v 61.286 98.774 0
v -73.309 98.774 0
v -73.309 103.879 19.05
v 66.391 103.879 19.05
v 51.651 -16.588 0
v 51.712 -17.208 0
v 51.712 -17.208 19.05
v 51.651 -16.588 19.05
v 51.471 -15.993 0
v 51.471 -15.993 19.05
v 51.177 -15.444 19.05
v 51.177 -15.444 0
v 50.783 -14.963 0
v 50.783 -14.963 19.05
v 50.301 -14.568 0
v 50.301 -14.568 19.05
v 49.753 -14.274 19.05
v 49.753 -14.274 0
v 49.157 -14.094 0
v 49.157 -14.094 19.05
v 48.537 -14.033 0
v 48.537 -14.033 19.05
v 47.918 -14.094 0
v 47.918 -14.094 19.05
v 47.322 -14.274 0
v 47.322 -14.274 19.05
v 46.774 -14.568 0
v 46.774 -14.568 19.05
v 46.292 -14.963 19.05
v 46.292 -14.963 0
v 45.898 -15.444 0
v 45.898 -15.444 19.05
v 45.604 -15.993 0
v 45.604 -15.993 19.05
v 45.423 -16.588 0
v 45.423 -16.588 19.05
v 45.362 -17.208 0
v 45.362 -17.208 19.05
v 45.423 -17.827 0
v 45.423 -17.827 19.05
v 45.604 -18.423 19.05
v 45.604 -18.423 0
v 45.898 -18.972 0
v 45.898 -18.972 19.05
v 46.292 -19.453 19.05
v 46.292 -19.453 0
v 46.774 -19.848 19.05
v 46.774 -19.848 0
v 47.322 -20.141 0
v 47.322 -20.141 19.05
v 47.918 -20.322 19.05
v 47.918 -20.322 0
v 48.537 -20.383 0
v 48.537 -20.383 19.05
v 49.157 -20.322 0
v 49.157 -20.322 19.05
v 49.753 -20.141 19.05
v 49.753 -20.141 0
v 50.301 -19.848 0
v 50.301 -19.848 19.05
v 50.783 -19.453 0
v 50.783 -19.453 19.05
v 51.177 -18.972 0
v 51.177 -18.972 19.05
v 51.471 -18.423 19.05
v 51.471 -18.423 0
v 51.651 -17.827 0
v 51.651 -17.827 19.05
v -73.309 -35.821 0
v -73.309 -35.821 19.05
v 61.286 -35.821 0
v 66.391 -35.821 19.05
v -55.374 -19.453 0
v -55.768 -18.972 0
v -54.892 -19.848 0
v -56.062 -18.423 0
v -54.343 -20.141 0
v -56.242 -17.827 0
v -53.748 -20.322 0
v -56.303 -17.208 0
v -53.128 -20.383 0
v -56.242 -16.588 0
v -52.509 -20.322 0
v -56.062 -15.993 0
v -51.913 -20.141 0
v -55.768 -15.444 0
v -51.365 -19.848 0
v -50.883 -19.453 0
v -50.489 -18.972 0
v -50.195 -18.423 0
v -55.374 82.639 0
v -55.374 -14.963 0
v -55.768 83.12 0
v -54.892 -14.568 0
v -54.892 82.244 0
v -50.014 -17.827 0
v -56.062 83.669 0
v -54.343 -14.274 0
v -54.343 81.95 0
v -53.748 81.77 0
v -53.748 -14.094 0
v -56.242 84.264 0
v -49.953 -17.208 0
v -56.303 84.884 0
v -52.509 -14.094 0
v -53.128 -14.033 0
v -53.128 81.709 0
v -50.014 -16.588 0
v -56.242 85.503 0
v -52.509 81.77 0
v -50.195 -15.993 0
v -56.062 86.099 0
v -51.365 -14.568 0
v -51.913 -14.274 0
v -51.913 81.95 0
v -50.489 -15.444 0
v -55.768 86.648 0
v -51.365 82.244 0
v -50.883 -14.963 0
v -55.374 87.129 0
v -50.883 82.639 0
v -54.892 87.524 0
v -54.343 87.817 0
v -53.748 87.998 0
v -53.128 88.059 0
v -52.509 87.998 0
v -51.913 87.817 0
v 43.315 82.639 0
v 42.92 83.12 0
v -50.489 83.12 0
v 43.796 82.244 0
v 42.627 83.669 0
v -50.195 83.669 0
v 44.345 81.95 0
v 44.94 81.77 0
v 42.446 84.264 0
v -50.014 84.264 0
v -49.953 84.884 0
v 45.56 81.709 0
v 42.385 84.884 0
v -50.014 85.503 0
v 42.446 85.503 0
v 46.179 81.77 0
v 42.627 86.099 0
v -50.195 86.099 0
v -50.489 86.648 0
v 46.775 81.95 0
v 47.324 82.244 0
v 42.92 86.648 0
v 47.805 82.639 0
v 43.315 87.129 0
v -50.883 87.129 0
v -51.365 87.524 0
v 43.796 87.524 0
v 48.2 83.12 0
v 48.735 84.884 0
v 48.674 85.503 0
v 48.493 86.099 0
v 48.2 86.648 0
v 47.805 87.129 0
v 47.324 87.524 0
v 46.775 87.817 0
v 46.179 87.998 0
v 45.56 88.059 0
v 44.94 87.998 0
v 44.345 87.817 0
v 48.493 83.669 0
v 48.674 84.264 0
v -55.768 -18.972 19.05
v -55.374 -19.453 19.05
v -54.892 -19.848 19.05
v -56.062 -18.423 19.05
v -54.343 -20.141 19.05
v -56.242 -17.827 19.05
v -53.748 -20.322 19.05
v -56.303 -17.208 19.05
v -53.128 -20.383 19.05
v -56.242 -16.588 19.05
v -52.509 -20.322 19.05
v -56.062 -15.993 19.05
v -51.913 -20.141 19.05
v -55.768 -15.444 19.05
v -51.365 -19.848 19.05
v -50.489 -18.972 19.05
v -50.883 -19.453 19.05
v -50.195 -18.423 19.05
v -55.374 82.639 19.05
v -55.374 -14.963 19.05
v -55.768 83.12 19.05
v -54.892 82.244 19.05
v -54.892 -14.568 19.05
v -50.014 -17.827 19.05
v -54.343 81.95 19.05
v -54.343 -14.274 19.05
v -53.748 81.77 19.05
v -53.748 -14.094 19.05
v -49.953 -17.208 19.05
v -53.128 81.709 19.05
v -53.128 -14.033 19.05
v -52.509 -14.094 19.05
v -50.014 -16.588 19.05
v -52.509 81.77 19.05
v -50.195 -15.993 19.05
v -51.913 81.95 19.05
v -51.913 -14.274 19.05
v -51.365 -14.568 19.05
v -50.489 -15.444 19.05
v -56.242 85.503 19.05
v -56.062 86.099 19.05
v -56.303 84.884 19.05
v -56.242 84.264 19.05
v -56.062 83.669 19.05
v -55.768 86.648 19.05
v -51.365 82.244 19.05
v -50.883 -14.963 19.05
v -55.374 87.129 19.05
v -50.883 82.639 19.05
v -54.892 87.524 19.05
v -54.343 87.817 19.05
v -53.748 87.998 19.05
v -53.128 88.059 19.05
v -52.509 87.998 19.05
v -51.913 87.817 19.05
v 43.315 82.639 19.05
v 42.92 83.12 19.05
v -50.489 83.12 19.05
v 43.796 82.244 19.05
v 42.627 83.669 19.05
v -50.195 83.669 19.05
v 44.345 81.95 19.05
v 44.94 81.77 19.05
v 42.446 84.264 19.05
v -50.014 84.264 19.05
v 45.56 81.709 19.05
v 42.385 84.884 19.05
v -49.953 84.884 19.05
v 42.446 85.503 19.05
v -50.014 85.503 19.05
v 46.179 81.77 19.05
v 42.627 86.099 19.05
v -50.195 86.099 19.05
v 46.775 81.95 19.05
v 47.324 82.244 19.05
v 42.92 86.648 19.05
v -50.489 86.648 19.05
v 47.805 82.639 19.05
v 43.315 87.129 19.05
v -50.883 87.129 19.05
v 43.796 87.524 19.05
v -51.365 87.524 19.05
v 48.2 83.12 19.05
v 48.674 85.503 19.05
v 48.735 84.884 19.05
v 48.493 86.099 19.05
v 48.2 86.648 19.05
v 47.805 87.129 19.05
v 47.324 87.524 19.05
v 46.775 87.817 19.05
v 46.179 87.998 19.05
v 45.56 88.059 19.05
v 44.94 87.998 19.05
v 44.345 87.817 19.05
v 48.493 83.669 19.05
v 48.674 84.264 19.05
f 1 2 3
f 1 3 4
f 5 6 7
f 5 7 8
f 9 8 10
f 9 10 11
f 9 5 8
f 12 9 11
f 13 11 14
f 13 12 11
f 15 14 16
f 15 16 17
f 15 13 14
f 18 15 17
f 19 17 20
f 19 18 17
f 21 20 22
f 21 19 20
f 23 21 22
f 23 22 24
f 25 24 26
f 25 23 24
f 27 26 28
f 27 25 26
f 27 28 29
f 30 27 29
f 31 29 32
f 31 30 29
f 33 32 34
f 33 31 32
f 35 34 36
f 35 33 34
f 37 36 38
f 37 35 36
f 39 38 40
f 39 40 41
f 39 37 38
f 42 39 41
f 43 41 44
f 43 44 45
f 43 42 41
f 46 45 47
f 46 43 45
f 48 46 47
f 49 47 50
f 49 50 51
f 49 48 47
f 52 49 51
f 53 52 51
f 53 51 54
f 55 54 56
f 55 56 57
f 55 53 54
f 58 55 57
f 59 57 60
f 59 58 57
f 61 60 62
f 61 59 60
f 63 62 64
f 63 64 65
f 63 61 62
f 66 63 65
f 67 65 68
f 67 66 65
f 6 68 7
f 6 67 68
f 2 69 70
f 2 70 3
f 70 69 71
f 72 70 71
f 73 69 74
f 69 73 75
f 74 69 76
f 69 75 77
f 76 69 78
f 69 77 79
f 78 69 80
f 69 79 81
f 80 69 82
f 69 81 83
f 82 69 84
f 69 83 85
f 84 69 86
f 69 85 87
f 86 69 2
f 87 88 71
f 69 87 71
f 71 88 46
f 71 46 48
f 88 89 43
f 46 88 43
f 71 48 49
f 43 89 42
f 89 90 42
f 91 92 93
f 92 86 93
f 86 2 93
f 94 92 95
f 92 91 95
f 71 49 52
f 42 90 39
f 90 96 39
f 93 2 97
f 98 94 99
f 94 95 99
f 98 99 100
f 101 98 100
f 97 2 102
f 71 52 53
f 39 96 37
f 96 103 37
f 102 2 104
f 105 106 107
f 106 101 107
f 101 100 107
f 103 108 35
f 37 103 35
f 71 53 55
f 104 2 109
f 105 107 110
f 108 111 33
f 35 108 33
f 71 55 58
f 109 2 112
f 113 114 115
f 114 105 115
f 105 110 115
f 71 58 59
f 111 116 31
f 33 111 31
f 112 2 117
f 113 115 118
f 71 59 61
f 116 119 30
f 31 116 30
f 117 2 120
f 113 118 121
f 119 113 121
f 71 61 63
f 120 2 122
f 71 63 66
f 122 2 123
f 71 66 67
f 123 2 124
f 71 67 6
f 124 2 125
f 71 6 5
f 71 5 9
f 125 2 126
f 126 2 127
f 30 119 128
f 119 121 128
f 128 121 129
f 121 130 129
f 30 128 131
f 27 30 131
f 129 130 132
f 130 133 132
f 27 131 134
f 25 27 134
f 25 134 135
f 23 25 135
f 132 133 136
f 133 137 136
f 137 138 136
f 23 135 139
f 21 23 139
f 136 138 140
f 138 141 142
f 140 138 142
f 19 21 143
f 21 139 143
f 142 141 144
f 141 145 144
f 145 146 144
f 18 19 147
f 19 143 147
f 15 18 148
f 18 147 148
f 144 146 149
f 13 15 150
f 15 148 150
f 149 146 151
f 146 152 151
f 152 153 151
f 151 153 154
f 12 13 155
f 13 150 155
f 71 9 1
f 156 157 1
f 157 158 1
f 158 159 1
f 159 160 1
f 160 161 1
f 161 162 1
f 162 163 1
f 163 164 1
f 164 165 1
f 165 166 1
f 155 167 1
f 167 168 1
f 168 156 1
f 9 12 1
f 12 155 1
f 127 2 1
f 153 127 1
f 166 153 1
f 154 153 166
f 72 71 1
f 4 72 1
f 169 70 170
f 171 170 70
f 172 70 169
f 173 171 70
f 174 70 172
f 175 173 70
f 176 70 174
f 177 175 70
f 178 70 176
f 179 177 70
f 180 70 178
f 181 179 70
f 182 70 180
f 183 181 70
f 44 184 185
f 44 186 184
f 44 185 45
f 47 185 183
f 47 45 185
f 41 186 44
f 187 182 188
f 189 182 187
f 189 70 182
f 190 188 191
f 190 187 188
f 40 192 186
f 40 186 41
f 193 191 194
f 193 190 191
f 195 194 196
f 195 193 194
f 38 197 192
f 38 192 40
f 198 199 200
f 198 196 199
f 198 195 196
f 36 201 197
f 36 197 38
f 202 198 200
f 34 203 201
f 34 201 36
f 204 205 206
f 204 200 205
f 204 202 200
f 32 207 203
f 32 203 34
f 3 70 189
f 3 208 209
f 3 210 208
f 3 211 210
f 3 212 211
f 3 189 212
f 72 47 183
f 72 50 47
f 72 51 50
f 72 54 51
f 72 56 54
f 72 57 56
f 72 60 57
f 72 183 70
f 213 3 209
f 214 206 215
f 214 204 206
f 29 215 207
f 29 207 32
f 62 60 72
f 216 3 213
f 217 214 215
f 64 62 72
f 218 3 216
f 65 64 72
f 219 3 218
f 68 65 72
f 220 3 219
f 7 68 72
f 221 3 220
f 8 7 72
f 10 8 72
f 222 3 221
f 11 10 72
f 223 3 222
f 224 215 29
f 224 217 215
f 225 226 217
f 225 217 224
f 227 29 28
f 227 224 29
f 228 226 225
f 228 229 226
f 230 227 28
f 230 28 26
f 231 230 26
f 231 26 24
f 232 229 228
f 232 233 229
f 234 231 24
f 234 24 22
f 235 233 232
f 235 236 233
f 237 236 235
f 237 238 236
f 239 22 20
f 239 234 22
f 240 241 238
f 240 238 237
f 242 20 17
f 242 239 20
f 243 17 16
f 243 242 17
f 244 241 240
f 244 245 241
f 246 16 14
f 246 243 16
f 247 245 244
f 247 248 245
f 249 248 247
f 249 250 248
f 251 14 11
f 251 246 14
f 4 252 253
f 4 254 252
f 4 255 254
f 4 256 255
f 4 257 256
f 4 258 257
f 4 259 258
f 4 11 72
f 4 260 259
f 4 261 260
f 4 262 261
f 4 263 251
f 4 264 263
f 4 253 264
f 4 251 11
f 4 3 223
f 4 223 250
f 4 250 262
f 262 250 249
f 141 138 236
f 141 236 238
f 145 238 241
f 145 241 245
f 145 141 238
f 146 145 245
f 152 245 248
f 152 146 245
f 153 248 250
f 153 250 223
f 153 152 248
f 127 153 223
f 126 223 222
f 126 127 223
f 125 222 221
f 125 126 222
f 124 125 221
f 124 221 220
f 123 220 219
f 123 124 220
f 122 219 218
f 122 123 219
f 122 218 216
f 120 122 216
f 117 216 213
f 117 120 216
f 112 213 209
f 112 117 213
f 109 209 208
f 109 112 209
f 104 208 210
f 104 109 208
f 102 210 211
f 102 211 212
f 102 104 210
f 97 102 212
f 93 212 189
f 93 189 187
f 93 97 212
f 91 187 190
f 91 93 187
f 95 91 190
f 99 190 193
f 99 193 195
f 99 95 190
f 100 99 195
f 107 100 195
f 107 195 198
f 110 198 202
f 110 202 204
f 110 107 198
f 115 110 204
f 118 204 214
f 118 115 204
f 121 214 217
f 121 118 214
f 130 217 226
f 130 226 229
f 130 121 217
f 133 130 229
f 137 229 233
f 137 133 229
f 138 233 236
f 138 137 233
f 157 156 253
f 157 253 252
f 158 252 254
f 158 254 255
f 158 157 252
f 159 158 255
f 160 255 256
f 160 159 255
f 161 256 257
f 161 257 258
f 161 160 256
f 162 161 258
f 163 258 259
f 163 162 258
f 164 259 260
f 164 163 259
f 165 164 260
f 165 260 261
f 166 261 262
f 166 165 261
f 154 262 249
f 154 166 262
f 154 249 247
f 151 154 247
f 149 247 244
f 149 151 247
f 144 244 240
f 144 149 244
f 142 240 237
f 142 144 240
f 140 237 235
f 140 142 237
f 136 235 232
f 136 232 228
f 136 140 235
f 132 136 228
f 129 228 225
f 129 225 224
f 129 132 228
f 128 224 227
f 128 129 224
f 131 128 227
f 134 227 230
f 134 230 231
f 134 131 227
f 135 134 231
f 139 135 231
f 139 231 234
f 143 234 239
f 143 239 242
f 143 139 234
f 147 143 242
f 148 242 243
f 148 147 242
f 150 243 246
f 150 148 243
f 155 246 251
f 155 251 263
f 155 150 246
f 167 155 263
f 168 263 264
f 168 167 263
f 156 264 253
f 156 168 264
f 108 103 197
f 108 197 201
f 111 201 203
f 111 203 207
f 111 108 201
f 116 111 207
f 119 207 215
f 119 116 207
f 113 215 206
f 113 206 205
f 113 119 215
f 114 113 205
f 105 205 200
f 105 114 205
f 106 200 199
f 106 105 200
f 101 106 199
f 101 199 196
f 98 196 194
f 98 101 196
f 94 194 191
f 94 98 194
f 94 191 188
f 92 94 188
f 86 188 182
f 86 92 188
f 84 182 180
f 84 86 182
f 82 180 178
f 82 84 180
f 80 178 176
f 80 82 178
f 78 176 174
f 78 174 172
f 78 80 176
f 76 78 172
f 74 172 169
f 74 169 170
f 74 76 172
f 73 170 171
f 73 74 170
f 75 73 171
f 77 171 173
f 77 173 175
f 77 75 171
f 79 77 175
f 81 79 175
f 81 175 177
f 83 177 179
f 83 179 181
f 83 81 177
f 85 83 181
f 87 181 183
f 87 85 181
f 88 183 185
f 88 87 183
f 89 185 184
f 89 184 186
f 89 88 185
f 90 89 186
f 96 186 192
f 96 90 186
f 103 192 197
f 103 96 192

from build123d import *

# Parameters (mm, degrees)
F0_W     = 139.7
F0_H     = 139.7
F0_R     = 3.175
F1_DEPTH = 19.05
F2_SIZE2 = 5.104422
F2_SIZE  = 19.04999


# Not quite as in the source:
# - a fillet or chamfer is up to 0.001 mm smaller than in the source, because OpenCascade refuses the exact size


with BuildPart() as f1:
    # F0 (on Top) → F1 (new body)
    with BuildSketch(Plane.XY):
        with Locations((-3.4590801224, 34.0288509236)):
            Rectangle(F0_W, F0_H)
        with Locations((-53.1284622848, -17.2076094896)):
            Circle(F0_R, mode=Mode.SUBTRACT)
        with Locations((48.5374927521, -17.2076094896)):
            Circle(F0_R, mode=Mode.SUBTRACT)
        with Locations((-53.1284622848, 84.8837196827)):
            Circle(F0_R, mode=Mode.SUBTRACT)
        with Locations((45.559823513, 84.8837196827)):
            Circle(F0_R, mode=Mode.SUBTRACT)
    extrude(amount=F1_DEPTH)

    # F2 (size 19.05 and 5.1044321158 in the source; OpenCascade refuses exactly that, so slightly less here)
    f2_edges = [f1.edges().sort_by_distance(p)[0] for p in [
        (66.39092, 34.028851, 0),
        (-3.45908, 103.878851, 0),
    ]]
    chamfer(f2_edges, length=F2_SIZE, length2=F2_SIZE2)


solid = f1.part
